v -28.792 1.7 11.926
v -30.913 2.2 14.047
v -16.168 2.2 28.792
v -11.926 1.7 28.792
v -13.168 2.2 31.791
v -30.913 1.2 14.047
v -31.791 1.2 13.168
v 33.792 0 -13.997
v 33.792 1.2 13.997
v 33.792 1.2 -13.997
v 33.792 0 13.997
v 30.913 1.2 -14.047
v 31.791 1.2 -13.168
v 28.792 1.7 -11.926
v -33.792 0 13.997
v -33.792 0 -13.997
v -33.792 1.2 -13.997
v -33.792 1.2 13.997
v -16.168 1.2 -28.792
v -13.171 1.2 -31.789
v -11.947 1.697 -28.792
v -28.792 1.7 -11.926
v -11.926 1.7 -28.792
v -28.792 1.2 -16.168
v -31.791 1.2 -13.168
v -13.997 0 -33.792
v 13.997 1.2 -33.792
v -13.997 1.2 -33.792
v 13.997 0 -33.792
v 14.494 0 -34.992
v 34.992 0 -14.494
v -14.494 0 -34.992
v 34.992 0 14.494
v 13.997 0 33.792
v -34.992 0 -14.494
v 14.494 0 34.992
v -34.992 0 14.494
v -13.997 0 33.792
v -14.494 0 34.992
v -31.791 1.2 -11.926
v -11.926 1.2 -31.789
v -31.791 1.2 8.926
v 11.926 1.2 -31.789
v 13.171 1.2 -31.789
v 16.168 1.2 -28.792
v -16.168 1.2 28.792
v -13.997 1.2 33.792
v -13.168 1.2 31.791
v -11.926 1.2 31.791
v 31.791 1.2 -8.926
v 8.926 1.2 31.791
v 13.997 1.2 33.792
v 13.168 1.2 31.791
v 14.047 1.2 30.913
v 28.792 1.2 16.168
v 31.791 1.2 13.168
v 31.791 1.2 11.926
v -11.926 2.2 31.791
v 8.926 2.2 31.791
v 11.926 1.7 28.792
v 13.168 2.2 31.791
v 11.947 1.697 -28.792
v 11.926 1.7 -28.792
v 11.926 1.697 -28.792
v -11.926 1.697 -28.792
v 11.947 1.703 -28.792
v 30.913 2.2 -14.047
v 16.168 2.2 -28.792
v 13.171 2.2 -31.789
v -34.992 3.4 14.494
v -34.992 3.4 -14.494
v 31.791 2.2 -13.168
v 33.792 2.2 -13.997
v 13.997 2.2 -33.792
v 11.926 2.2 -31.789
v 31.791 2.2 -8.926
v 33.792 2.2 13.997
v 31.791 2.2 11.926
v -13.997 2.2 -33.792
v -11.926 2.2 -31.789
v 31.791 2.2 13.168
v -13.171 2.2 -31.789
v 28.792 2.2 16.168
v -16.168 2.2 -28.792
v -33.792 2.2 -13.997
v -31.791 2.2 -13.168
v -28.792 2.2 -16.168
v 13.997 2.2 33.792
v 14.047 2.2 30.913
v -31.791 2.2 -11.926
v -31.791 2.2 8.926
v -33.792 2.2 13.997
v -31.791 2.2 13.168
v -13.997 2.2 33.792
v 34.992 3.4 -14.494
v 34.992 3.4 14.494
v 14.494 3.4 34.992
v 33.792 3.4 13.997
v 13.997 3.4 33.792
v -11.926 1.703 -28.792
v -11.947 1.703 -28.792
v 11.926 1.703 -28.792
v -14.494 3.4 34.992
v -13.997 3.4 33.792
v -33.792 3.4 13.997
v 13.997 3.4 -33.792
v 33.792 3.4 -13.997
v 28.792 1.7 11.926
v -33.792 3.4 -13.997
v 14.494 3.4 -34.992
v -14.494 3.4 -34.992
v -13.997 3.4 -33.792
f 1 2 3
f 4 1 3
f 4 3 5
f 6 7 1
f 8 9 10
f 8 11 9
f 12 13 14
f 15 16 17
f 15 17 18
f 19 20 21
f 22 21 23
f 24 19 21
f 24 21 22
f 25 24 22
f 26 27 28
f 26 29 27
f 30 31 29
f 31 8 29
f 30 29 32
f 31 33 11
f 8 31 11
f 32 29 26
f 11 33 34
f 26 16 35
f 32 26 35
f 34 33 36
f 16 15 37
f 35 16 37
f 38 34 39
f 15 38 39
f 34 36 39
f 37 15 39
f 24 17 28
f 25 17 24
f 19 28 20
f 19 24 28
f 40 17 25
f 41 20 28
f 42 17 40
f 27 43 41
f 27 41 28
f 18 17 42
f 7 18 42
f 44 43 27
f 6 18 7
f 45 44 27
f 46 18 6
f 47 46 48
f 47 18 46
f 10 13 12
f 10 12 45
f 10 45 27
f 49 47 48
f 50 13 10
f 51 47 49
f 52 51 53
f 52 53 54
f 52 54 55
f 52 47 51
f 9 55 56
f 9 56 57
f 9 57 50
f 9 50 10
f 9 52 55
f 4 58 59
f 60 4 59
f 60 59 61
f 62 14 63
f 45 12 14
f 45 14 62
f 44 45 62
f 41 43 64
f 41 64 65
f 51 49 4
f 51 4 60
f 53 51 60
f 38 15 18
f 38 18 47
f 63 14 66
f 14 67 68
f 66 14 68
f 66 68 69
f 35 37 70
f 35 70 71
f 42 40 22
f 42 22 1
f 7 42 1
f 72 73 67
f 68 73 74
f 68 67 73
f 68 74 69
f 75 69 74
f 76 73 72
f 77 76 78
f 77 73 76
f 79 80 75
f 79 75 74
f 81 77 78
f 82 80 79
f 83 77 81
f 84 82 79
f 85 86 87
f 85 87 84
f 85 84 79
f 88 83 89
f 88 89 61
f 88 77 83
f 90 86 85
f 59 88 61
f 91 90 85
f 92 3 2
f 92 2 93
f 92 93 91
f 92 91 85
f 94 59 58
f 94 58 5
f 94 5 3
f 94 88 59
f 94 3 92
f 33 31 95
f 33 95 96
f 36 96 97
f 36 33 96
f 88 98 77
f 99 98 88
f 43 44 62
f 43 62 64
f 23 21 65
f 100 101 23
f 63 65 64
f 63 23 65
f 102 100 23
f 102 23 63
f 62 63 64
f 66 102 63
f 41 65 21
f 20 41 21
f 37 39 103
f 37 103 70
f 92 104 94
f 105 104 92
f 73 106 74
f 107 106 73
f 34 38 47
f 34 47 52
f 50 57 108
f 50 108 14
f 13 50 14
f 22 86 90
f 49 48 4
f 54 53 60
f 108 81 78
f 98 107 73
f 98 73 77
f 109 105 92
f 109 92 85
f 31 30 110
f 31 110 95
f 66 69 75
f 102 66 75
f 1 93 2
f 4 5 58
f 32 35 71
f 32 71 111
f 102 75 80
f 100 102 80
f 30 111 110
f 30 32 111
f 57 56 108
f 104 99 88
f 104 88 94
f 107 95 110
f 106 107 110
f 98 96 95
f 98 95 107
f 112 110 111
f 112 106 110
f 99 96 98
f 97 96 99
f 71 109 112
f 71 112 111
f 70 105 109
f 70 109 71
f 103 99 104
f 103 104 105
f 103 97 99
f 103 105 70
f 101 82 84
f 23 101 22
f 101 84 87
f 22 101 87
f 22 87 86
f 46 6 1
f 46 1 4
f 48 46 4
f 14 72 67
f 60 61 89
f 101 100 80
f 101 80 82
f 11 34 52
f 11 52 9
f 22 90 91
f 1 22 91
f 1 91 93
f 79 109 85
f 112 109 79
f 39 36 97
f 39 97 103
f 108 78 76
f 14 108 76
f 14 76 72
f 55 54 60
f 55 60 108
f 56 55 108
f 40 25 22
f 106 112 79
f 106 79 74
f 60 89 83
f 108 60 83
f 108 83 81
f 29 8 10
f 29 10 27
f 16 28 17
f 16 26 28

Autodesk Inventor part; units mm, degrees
ref_plane "YZ Plane" through (0, 0, 0) normal (1, 0, 0) x (0, 1, 0)
ref_plane "XZ Plane" through (0, 0, 0) normal (0, 1, 0) x (-1, 0, 0)
sketch "스케치1" plane through (0, 0, 0) normal (0, 1, 0) x (-1, 0, 0)
  line L0 (-32.5919, 13.5) -> (-13.5, 32.5919)
  line L1 (-13.5, 32.5919) -> (13.5, 32.5919)
  line L2 (13.5, 32.5919) -> (32.5919, 13.5)
  line L3 (32.5919, 13.5) -> (32.5919, -13.5)
  line L4 (32.5919, -13.5) -> (13.5, -32.5919)
  line L5 (13.5, -32.5919) -> (-13.5, -32.5919)
  line L6 (-13.5, -32.5919) -> (-32.5919, -13.5)
  line L7 (-32.5919, -13.5) -> (-32.5919, 13.5)
  line L8 (34.9919, 14.4941) -> (34.9919, -14.4941)
  line L9 (34.9919, -14.4941) -> (14.4941, -34.9919)
  line L10 (14.4941, -34.9919) -> (-14.4941, -34.9919)
  line L11 (-14.4941, -34.9919) -> (-34.9919, -14.4941)
  line L12 (-34.9919, -14.4941) -> (-34.9919, 14.4941)
  line L13 (-34.9919, 14.4941) -> (-14.4941, 34.9919)
  line L14 (-14.4941, 34.9919) -> (14.4941, 34.9919)
  line L15 (14.4941, 34.9919) -> (34.9919, 14.4941)
  point P0 (0, 0)
  point P1 (0, 0)
  point P2 (0, 0)
  dimension "d0" = 27
  dimension "d1" = 2.4
extrude "돌출1" add sketch "스케치1" along normal blind 3.4 contours L0 L1 L2 L3 L4 L5 L6 L7 | L8 L9 L10 L11 L12 L13 L14 L15
sketch "스케치3" plane through (0, 0, 0) normal (0, -1, 0) x (1, 0, 0)
  line L0 (-13.5, 32.5919) -> (13.5, 32.5919)
  line L1 (13.5, 32.5919) -> (32.5919, 13.5)
  line L2 (32.5919, 13.5) -> (32.5919, -13.5)
  line L3 (32.5919, -13.5) -> (13.5, -32.5919)
  line L4 (13.5, -32.5919) -> (-13.5, -32.5919)
  line L5 (-13.5, -32.5919) -> (-32.5919, -13.5)
  line L6 (-32.5919, -13.5) -> (-32.5919, 13.5)
  line L7 (-32.5919, 13.5) -> (-13.5, 32.5919)
  line L8 (-13.9971, 33.7919) -> (13.9971, 33.7919)
  line L9 (13.9971, 33.7919) -> (33.7919, 13.9971)
  line L10 (33.7919, 13.9971) -> (33.7919, -13.9971)
  line L11 (33.7919, -13.9971) -> (13.9971, -33.7919)
  line L12 (13.9971, -33.7919) -> (-13.9971, -33.7919)
  line L13 (-13.9971, -33.7919) -> (-33.7919, -13.9971)
  line L14 (-33.7919, -13.9971) -> (-33.7919, 13.9971)
  line L15 (-33.7919, 13.9971) -> (-13.9971, 33.7919)
  line L16 (-13.1686, 31.7919) -> (13.1686, 31.7919)
  line L17 (13.1686, 31.7919) -> (31.7919, 13.1686)
  line L18 (31.7919, 13.1686) -> (31.7919, -13.1686)
  line L19 (31.7919, -13.1686) -> (13.1686, -31.7919)
  line L20 (13.1686, -31.7919) -> (-13.1686, -31.7919)
  line L21 (-13.1686, -31.7919) -> (-31.7919, -13.1686)
  line L22 (-31.7919, -13.1686) -> (-31.7919, 13.1686)
  line L23 (-31.7919, 13.1686) -> (-13.1686, 31.7919)
  point P0 (0, 0)
  point P1 (0, 0)
  point P2 (0, 0)
  point P3 (0, 0)
  dimension "d8" = 27
  dimension "d9" = 1.2
  dimension "d19" = 0.8
extrude "돌출3" cut sketch "스케치3" against normal blind 1.2 contours L0 L1 L2 L3 L4 L5 L6 L7 | L8 L9 L10 L11 L12 L13 L14 L15 | L16 L17 L18 L19 L20 L21 L22 L23
sketch "스케치4" plane through (0, 3.4, 0) normal (0, 1, 0) x (1, 0, 0)
  line L0 (11.926, -28.7919) -> (-11.926, -28.7919)
  line L1 (-11.926, -28.7919) -> (-28.7919, -11.926)
  line L2 (-28.7919, -11.926) -> (-28.7919, 11.926)
  line L3 (-28.7919, 11.926) -> (-11.926, 28.7919)
  line L4 (-11.926, 28.7919) -> (11.926, 28.7919)
  line L5 (11.926, 28.7919) -> (28.7919, 11.926)
  line L6 (28.7919, 11.926) -> (28.7919, -11.926)
  line L7 (28.7919, -11.926) -> (11.926, -28.7919)
  line L8 (-31.7919, -13.1686) -> (-31.7919, 13.1686) projected
  point P0 (0, 0)
  point P1 (0, 0)
  dimension "d21" = 3
extrude "돌출4" cut sketch "스케치4" against normal blind 5
ref_plane "작업 평면1" through (0, 1.7, 0) normal (0, 1, 0) x (1, 0, 0)
sketch "스케치6" plane through (0, 0, 0) normal (0, -1, 0) x (1, 0, 0)
  line L0 (28.7919, -11.926) -> (11.926, -28.7919) projected
  line L1 (11.926, -28.7919) -> (-11.926, -28.7919) projected
  line L2 (-11.926, -28.7919) -> (-28.7919, -11.926) projected
  line L3 (-28.7919, -11.926) -> (-28.7919, 11.926) projected
  line L4 (-28.7919, 11.926) -> (-11.926, 28.7919) projected
  line L5 (-11.926, 28.7919) -> (11.926, 28.7919) projected
  line L6 (11.926, 28.7919) -> (28.7919, 11.926) projected
  line L7 (28.7919, 11.926) -> (28.7919, -11.926) projected
  line L8 (31.7919, 13.1686) -> (13.1686, 31.7919) projected
  line L9 (13.1686, 31.7919) -> (-13.1686, 31.7919) projected
  line L10 (-13.1686, 31.7919) -> (-31.7919, 13.1686) projected
  line L11 (-31.7919, 13.1686) -> (-31.7919, -13.1686) projected
  line L12 (-31.7919, -13.1686) -> (-13.1686, -31.7919) projected
  line L13 (-13.1686, -31.7919) -> (13.1686, -31.7919) projected
  line L14 (13.1686, -31.7919) -> (31.7919, -13.1686) projected
  line L15 (31.7919, -13.1686) -> (31.7919, 13.1686) projected
  point P0 (0, 0)
extrude "돌출7" cut sketch "스케치6" against normal blind 1.2
mirror "미러2" about plane through (0, 1.7, 0) normal (0, 1, 0) of "돌출7", "돌출3"
chamfer "모따기22" distance 0.5 distance2 3 2 edges at (-20.3589, 1.2, -20.3589) (-20.3589, 2.2, -20.3589) measured on face at (-17.548, 1.8667, -23.1699)
chamfer "모따기23" distance 0.5 distance2 3 2 edges at (-28.7919, 1.2, 0) (-28.7919, 2.2, 0) measured on face at (-28.7919, 1.6998, 3.9753)
chamfer "모따기24" distance 0.5 distance2 3 2 edges at (-20.3589, 1.2, 20.3589) (-20.3589, 2.2, 20.3589) measured on face at (-17.548, 1.6998, 23.1699)
chamfer "모따기25" distance 0.5 distance2 3 2 edges at (0, 1.2, 28.7919) (0, 2.2, 28.7919) measured on face at (3.9753, 1.6998, 28.7919)
chamfer "모따기26" distance 0.5 distance2 3 2 edges at (20.3589, 1.2, 20.3589) (20.3589, 2.2, 20.3589) measured on face at (23.1699, 1.7002, 17.548)
chamfer "모따기27" distance 0.5 distance2 3 2 edges at (28.7919, 1.2, 0) (28.7919, 2.2, 0) measured on face at (28.7919, 1.7002, -3.9753)
chamfer "모따기28" distance 0.5 distance2 3 2 edges at (20.3589, 1.2, -20.3589) (20.3589, 2.2, -20.3589) measured on face at (17.548, 1.7002, -23.1699)
chamfer "모따기29" distance 0.5 distance2 3 2 edges at (0, 1.2, -28.7919) (0, 2.2, -28.7919) measured on face at (-3.9753, 2.0335, -28.7919)
properties part number "OV-PAM_ring_2"
